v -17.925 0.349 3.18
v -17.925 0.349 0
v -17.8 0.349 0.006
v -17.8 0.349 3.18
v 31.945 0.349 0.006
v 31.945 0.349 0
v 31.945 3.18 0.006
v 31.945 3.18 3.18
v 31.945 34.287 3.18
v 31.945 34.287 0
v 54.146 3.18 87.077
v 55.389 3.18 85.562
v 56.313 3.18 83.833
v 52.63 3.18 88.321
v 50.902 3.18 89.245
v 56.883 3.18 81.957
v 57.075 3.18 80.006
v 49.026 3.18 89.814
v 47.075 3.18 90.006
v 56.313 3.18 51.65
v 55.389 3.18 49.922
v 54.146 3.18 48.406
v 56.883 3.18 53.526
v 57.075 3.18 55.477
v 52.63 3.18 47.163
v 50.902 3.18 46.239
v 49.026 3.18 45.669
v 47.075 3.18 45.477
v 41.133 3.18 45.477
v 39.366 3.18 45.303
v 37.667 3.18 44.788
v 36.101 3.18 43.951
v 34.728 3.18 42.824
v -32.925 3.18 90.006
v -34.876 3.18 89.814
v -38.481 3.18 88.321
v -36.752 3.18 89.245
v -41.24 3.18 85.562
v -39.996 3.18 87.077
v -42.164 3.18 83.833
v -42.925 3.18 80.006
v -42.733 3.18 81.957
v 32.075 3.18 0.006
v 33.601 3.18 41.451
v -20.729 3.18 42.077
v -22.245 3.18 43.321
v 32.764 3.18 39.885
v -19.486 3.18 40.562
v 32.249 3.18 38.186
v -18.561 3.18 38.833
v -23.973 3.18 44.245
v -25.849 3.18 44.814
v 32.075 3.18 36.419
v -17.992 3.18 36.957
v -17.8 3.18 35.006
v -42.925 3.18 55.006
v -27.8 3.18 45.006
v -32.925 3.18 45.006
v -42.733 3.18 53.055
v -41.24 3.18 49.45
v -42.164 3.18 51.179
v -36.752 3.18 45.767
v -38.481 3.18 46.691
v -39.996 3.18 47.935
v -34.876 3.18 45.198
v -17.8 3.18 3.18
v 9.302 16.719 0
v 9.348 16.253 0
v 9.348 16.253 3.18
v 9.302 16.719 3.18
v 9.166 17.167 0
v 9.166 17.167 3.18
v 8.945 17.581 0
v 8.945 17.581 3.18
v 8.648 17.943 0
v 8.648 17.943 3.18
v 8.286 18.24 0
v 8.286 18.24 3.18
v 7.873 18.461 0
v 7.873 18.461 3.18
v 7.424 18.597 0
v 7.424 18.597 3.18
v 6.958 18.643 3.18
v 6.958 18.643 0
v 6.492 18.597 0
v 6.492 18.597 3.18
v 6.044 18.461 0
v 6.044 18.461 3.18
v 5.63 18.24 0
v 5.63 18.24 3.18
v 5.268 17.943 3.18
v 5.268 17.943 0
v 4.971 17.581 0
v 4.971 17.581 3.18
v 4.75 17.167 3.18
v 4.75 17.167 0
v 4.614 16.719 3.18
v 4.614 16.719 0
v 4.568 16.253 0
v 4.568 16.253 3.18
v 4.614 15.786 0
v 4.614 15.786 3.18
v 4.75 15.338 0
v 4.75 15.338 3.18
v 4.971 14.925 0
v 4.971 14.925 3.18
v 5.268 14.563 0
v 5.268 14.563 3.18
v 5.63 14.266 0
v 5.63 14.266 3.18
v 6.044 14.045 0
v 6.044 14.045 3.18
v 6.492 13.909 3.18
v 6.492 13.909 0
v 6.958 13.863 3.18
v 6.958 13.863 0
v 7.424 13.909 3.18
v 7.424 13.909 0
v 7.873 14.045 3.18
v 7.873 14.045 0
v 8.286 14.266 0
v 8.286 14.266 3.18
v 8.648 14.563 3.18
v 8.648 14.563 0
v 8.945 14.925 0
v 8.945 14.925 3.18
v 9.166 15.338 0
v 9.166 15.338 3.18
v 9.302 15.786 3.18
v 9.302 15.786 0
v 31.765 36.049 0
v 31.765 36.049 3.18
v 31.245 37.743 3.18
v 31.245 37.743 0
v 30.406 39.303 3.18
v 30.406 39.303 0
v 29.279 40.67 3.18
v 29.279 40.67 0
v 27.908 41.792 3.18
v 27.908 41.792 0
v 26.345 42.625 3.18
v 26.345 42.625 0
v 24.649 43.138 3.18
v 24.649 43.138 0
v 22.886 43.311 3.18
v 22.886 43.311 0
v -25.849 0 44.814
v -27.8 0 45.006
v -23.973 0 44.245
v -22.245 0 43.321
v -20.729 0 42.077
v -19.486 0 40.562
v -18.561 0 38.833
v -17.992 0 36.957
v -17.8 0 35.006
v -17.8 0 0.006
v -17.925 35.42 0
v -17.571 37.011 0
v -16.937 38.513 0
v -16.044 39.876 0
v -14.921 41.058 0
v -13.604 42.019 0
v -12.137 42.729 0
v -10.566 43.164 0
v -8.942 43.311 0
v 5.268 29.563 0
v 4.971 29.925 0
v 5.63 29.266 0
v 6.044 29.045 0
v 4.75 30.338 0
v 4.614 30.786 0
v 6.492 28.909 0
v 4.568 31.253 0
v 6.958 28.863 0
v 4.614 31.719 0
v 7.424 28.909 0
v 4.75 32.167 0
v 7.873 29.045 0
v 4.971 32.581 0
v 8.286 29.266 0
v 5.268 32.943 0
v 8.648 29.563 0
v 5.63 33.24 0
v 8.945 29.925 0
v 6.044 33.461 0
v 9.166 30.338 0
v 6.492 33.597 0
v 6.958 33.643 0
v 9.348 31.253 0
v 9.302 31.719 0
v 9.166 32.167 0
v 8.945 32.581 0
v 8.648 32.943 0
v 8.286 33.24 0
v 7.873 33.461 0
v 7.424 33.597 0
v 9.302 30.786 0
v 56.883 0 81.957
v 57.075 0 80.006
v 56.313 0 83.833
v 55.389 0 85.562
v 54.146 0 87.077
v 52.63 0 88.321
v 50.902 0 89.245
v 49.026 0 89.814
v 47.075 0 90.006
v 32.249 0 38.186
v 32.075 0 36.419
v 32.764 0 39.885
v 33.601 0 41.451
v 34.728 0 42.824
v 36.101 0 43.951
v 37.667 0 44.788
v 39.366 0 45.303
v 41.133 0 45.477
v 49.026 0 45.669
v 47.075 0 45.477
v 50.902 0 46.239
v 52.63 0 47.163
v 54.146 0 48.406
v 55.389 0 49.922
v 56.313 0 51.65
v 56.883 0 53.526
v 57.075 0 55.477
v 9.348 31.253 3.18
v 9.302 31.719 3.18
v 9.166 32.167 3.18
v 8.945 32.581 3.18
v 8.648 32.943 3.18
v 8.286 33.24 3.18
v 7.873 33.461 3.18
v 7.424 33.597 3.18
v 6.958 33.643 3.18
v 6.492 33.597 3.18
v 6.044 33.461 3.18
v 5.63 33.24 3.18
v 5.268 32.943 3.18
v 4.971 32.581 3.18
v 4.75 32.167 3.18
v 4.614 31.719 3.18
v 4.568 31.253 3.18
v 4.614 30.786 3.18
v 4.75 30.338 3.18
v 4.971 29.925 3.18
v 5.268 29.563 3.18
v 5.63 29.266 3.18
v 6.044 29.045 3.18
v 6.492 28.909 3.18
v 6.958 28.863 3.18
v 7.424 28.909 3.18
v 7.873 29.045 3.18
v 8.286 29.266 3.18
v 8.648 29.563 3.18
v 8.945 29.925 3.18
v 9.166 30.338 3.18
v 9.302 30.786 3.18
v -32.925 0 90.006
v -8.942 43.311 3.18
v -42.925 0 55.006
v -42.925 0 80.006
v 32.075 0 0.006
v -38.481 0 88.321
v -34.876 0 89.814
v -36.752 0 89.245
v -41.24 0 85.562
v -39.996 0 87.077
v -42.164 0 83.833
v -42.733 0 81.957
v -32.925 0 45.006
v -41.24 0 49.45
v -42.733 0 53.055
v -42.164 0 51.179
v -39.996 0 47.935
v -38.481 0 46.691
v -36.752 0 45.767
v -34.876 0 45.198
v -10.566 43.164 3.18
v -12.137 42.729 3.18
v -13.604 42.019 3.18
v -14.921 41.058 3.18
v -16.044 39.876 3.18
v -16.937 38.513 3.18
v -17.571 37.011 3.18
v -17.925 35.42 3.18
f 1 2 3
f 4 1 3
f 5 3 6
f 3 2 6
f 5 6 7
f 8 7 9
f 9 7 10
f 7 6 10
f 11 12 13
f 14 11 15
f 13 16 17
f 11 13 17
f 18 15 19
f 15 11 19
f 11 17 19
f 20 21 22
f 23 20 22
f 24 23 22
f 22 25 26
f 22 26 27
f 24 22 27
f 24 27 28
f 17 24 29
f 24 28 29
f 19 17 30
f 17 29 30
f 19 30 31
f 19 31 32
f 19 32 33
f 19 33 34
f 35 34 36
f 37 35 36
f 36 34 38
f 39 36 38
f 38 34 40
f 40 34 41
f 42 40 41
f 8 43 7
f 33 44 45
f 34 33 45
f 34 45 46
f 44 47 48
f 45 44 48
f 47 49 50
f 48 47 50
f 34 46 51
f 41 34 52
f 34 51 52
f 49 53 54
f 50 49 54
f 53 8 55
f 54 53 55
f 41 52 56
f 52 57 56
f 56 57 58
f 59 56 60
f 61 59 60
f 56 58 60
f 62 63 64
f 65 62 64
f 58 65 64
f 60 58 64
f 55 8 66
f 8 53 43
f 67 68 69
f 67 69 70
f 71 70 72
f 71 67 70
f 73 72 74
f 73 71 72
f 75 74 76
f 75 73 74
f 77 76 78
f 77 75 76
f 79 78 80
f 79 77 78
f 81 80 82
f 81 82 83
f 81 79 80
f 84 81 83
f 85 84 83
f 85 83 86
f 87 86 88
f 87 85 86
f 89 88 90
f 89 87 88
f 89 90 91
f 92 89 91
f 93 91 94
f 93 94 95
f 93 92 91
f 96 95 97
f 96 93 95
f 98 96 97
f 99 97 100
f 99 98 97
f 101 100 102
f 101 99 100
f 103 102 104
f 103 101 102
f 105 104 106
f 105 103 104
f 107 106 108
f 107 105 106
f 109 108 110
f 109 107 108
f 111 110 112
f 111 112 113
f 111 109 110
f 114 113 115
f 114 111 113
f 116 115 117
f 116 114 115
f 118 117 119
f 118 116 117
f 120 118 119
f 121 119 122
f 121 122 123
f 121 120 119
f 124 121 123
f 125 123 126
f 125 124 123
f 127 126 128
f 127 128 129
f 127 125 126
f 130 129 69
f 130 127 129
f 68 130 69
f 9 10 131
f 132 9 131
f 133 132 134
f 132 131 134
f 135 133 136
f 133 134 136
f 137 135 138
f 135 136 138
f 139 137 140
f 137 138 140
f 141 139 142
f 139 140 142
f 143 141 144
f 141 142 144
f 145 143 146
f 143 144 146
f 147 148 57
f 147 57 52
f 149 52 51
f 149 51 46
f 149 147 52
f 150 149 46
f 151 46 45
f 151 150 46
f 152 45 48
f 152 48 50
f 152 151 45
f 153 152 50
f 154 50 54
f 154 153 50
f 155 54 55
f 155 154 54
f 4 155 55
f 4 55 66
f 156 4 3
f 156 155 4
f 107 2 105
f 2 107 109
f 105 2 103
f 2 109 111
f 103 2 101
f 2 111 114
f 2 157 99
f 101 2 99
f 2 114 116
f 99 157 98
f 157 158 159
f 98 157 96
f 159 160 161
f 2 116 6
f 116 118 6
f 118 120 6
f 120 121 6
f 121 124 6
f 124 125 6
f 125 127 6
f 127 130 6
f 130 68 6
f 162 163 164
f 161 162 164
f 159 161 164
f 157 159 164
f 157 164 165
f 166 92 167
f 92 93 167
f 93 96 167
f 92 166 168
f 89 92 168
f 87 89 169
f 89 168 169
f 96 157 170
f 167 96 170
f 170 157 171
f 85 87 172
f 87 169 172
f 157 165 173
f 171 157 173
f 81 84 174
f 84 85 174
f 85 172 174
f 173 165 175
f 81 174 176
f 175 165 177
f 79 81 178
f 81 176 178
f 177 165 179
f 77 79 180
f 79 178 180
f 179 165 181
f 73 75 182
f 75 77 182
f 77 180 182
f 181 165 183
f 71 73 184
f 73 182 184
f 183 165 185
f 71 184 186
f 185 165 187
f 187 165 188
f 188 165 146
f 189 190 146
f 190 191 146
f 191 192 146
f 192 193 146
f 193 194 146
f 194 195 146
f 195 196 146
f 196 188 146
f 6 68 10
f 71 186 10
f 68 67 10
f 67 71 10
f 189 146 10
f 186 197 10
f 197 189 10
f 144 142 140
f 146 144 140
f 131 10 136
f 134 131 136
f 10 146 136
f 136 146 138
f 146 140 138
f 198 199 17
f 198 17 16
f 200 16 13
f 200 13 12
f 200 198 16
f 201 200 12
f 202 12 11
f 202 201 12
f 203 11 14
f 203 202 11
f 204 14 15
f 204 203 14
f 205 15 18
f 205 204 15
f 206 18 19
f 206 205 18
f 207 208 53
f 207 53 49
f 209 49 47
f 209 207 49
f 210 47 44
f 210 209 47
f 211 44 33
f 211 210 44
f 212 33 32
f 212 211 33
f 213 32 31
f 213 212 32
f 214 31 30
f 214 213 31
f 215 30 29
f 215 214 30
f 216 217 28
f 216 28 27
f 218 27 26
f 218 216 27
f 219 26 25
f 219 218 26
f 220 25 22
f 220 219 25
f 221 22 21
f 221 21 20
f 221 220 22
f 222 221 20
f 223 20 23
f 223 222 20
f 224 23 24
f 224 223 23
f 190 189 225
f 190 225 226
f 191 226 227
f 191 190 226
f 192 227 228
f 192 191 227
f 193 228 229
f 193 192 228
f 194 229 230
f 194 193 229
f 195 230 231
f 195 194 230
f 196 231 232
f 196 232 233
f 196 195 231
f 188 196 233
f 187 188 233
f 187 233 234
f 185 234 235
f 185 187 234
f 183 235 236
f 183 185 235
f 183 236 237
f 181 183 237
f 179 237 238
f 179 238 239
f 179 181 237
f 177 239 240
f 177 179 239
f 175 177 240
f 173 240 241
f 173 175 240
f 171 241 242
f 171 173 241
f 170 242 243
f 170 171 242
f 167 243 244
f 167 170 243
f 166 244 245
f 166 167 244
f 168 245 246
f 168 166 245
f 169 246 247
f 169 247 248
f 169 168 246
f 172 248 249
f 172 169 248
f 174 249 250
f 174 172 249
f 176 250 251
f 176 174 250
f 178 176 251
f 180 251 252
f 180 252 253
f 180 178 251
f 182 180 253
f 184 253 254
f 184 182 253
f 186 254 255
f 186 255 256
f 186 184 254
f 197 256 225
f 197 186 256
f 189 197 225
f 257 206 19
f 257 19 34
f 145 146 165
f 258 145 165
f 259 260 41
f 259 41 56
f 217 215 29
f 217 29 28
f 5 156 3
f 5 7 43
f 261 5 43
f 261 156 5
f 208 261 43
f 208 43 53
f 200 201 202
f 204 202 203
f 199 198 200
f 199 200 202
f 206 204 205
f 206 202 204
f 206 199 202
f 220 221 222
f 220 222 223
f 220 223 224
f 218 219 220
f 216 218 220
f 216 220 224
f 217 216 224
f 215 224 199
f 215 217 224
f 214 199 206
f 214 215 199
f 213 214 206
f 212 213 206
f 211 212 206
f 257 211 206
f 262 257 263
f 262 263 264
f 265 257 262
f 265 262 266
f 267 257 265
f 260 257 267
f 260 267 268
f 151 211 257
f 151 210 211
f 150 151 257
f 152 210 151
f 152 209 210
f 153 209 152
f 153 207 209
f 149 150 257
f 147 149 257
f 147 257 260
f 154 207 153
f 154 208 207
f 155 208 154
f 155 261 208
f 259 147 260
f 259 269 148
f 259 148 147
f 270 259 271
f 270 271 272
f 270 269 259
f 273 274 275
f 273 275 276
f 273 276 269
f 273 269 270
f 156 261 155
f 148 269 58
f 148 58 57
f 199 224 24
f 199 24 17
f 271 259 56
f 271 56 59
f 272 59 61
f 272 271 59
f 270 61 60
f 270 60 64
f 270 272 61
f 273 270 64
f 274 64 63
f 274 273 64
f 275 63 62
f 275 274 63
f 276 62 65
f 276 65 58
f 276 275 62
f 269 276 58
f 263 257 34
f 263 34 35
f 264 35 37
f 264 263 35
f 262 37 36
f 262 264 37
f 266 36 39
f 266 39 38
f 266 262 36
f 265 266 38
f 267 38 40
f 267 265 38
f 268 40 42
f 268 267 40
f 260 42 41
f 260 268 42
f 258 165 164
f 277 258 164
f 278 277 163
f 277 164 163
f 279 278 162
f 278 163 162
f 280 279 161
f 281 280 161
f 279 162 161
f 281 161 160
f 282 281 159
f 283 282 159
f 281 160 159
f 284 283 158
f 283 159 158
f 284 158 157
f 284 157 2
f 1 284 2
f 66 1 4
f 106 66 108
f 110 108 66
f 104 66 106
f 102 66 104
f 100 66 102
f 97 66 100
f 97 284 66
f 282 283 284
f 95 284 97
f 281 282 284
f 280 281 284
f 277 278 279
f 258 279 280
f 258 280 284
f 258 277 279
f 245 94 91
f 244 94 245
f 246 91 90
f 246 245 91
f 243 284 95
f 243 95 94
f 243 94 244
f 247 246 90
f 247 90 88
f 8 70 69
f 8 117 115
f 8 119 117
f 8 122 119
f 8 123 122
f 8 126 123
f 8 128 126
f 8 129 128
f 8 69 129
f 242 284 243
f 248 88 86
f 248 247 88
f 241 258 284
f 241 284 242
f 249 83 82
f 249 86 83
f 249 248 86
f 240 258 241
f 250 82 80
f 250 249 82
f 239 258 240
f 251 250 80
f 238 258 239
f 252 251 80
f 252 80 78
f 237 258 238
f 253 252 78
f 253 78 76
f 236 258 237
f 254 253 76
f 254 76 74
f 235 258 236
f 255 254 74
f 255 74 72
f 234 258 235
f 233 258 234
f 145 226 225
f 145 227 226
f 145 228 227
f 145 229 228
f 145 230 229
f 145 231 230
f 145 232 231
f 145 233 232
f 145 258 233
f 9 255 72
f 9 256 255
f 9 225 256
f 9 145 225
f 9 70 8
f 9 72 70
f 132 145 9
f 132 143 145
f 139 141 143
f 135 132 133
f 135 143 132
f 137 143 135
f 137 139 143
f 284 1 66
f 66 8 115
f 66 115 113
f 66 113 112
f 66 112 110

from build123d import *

# Parameters (mm, degrees)
SKETCH4_R           = 2.39
BOSS_EXTRUDE4_DEPTH = 3.18
BOSS_EXTRUDE5_DEPTH = 3.18


with BuildPart() as part:
    # Sketch4 → Boss-Extrude4 (new body)
    with BuildSketch(Plane.XY):
        with BuildLine():
            Line((-17.925296466, 35.419639483), (-17.925296466, 0.349476153))
            Line((-17.925296466, 0.349476153), (31.944623299, 0.349476153))
            Line((31.944623299, 0.349476153), (31.944623299, 34.287104082))
            ThreePointArc((31.944623299, 34.287104082), (29.279371809, 40.670159183), (22.886251145, 43.311175294))
            Line((22.886251145, 43.311175294), (-8.942333261, 43.311175294))
            ThreePointArc((-8.942333261, 43.311175294), (-14.920835694, 41.058088475), (-17.925296466, 35.419639483))
        make_face()
        with Locations((6.958119852, 31.252737949)):
            Circle(SKETCH4_R, mode=Mode.SUBTRACT)
        with Locations((6.958119852, 16.252738122)):
            Circle(SKETCH4_R, mode=Mode.SUBTRACT)
    extrude(amount=BOSS_EXTRUDE4_DEPTH)

    # Sketch2 → Boss-Extrude5 (add)
    with BuildSketch(Plane(origin=(0, 0, 0), x_dir=(1, 0, 0), z_dir=(0, 1, 0))):
        with BuildLine():
            Line((41.133140879, -45.477323382), (47.074703534, -45.477323382))
            ThreePointArc((47.074703534, -45.477323382), (54.145771346, -48.40625557), (57.074703534, -55.477323382))
            Line((57.074703534, -55.477323382), (57.074703534, -80.006057453))
            ThreePointArc((57.074703534, -80.006057453), (54.145771346, -87.077125264), (47.074703534, -90.006057453))
            Line((47.074703534, -90.006057453), (-32.925296466, -90.006057453))
            ThreePointArc((-32.925296466, -90.006057453), (-39.996364277, -87.077125264), (-42.925296466, -80.006057453))
            Line((-42.925296466, -80.006057453), (-42.925296466, -55.006057453))
            ThreePointArc((-42.925296466, -55.006057453), (-39.996364277, -47.934989641), (-32.925296466, -45.006057453))
            Line((-32.925296466, -45.006057453), (-27.800216568, -45.006057453))
            ThreePointArc((-27.800216568, -45.006057453), (-20.729148756, -42.077125264), (-17.800216568, -35.006057453))
            Line((-17.800216568, -35.006057453), (-17.800216568, -0.006057453))
            Line((-17.800216568, -0.006057453), (32.074703534, -0.006057453))
            Line((32.074703534, -0.006057453), (32.074703534, -36.418886037))
            ThreePointArc((32.074703534, -36.418886037), (34.727858406, -42.824168511), (41.133140879, -45.477323382))
        make_face()
    extrude(amount=BOSS_EXTRUDE5_DEPTH)


solid = part.part
